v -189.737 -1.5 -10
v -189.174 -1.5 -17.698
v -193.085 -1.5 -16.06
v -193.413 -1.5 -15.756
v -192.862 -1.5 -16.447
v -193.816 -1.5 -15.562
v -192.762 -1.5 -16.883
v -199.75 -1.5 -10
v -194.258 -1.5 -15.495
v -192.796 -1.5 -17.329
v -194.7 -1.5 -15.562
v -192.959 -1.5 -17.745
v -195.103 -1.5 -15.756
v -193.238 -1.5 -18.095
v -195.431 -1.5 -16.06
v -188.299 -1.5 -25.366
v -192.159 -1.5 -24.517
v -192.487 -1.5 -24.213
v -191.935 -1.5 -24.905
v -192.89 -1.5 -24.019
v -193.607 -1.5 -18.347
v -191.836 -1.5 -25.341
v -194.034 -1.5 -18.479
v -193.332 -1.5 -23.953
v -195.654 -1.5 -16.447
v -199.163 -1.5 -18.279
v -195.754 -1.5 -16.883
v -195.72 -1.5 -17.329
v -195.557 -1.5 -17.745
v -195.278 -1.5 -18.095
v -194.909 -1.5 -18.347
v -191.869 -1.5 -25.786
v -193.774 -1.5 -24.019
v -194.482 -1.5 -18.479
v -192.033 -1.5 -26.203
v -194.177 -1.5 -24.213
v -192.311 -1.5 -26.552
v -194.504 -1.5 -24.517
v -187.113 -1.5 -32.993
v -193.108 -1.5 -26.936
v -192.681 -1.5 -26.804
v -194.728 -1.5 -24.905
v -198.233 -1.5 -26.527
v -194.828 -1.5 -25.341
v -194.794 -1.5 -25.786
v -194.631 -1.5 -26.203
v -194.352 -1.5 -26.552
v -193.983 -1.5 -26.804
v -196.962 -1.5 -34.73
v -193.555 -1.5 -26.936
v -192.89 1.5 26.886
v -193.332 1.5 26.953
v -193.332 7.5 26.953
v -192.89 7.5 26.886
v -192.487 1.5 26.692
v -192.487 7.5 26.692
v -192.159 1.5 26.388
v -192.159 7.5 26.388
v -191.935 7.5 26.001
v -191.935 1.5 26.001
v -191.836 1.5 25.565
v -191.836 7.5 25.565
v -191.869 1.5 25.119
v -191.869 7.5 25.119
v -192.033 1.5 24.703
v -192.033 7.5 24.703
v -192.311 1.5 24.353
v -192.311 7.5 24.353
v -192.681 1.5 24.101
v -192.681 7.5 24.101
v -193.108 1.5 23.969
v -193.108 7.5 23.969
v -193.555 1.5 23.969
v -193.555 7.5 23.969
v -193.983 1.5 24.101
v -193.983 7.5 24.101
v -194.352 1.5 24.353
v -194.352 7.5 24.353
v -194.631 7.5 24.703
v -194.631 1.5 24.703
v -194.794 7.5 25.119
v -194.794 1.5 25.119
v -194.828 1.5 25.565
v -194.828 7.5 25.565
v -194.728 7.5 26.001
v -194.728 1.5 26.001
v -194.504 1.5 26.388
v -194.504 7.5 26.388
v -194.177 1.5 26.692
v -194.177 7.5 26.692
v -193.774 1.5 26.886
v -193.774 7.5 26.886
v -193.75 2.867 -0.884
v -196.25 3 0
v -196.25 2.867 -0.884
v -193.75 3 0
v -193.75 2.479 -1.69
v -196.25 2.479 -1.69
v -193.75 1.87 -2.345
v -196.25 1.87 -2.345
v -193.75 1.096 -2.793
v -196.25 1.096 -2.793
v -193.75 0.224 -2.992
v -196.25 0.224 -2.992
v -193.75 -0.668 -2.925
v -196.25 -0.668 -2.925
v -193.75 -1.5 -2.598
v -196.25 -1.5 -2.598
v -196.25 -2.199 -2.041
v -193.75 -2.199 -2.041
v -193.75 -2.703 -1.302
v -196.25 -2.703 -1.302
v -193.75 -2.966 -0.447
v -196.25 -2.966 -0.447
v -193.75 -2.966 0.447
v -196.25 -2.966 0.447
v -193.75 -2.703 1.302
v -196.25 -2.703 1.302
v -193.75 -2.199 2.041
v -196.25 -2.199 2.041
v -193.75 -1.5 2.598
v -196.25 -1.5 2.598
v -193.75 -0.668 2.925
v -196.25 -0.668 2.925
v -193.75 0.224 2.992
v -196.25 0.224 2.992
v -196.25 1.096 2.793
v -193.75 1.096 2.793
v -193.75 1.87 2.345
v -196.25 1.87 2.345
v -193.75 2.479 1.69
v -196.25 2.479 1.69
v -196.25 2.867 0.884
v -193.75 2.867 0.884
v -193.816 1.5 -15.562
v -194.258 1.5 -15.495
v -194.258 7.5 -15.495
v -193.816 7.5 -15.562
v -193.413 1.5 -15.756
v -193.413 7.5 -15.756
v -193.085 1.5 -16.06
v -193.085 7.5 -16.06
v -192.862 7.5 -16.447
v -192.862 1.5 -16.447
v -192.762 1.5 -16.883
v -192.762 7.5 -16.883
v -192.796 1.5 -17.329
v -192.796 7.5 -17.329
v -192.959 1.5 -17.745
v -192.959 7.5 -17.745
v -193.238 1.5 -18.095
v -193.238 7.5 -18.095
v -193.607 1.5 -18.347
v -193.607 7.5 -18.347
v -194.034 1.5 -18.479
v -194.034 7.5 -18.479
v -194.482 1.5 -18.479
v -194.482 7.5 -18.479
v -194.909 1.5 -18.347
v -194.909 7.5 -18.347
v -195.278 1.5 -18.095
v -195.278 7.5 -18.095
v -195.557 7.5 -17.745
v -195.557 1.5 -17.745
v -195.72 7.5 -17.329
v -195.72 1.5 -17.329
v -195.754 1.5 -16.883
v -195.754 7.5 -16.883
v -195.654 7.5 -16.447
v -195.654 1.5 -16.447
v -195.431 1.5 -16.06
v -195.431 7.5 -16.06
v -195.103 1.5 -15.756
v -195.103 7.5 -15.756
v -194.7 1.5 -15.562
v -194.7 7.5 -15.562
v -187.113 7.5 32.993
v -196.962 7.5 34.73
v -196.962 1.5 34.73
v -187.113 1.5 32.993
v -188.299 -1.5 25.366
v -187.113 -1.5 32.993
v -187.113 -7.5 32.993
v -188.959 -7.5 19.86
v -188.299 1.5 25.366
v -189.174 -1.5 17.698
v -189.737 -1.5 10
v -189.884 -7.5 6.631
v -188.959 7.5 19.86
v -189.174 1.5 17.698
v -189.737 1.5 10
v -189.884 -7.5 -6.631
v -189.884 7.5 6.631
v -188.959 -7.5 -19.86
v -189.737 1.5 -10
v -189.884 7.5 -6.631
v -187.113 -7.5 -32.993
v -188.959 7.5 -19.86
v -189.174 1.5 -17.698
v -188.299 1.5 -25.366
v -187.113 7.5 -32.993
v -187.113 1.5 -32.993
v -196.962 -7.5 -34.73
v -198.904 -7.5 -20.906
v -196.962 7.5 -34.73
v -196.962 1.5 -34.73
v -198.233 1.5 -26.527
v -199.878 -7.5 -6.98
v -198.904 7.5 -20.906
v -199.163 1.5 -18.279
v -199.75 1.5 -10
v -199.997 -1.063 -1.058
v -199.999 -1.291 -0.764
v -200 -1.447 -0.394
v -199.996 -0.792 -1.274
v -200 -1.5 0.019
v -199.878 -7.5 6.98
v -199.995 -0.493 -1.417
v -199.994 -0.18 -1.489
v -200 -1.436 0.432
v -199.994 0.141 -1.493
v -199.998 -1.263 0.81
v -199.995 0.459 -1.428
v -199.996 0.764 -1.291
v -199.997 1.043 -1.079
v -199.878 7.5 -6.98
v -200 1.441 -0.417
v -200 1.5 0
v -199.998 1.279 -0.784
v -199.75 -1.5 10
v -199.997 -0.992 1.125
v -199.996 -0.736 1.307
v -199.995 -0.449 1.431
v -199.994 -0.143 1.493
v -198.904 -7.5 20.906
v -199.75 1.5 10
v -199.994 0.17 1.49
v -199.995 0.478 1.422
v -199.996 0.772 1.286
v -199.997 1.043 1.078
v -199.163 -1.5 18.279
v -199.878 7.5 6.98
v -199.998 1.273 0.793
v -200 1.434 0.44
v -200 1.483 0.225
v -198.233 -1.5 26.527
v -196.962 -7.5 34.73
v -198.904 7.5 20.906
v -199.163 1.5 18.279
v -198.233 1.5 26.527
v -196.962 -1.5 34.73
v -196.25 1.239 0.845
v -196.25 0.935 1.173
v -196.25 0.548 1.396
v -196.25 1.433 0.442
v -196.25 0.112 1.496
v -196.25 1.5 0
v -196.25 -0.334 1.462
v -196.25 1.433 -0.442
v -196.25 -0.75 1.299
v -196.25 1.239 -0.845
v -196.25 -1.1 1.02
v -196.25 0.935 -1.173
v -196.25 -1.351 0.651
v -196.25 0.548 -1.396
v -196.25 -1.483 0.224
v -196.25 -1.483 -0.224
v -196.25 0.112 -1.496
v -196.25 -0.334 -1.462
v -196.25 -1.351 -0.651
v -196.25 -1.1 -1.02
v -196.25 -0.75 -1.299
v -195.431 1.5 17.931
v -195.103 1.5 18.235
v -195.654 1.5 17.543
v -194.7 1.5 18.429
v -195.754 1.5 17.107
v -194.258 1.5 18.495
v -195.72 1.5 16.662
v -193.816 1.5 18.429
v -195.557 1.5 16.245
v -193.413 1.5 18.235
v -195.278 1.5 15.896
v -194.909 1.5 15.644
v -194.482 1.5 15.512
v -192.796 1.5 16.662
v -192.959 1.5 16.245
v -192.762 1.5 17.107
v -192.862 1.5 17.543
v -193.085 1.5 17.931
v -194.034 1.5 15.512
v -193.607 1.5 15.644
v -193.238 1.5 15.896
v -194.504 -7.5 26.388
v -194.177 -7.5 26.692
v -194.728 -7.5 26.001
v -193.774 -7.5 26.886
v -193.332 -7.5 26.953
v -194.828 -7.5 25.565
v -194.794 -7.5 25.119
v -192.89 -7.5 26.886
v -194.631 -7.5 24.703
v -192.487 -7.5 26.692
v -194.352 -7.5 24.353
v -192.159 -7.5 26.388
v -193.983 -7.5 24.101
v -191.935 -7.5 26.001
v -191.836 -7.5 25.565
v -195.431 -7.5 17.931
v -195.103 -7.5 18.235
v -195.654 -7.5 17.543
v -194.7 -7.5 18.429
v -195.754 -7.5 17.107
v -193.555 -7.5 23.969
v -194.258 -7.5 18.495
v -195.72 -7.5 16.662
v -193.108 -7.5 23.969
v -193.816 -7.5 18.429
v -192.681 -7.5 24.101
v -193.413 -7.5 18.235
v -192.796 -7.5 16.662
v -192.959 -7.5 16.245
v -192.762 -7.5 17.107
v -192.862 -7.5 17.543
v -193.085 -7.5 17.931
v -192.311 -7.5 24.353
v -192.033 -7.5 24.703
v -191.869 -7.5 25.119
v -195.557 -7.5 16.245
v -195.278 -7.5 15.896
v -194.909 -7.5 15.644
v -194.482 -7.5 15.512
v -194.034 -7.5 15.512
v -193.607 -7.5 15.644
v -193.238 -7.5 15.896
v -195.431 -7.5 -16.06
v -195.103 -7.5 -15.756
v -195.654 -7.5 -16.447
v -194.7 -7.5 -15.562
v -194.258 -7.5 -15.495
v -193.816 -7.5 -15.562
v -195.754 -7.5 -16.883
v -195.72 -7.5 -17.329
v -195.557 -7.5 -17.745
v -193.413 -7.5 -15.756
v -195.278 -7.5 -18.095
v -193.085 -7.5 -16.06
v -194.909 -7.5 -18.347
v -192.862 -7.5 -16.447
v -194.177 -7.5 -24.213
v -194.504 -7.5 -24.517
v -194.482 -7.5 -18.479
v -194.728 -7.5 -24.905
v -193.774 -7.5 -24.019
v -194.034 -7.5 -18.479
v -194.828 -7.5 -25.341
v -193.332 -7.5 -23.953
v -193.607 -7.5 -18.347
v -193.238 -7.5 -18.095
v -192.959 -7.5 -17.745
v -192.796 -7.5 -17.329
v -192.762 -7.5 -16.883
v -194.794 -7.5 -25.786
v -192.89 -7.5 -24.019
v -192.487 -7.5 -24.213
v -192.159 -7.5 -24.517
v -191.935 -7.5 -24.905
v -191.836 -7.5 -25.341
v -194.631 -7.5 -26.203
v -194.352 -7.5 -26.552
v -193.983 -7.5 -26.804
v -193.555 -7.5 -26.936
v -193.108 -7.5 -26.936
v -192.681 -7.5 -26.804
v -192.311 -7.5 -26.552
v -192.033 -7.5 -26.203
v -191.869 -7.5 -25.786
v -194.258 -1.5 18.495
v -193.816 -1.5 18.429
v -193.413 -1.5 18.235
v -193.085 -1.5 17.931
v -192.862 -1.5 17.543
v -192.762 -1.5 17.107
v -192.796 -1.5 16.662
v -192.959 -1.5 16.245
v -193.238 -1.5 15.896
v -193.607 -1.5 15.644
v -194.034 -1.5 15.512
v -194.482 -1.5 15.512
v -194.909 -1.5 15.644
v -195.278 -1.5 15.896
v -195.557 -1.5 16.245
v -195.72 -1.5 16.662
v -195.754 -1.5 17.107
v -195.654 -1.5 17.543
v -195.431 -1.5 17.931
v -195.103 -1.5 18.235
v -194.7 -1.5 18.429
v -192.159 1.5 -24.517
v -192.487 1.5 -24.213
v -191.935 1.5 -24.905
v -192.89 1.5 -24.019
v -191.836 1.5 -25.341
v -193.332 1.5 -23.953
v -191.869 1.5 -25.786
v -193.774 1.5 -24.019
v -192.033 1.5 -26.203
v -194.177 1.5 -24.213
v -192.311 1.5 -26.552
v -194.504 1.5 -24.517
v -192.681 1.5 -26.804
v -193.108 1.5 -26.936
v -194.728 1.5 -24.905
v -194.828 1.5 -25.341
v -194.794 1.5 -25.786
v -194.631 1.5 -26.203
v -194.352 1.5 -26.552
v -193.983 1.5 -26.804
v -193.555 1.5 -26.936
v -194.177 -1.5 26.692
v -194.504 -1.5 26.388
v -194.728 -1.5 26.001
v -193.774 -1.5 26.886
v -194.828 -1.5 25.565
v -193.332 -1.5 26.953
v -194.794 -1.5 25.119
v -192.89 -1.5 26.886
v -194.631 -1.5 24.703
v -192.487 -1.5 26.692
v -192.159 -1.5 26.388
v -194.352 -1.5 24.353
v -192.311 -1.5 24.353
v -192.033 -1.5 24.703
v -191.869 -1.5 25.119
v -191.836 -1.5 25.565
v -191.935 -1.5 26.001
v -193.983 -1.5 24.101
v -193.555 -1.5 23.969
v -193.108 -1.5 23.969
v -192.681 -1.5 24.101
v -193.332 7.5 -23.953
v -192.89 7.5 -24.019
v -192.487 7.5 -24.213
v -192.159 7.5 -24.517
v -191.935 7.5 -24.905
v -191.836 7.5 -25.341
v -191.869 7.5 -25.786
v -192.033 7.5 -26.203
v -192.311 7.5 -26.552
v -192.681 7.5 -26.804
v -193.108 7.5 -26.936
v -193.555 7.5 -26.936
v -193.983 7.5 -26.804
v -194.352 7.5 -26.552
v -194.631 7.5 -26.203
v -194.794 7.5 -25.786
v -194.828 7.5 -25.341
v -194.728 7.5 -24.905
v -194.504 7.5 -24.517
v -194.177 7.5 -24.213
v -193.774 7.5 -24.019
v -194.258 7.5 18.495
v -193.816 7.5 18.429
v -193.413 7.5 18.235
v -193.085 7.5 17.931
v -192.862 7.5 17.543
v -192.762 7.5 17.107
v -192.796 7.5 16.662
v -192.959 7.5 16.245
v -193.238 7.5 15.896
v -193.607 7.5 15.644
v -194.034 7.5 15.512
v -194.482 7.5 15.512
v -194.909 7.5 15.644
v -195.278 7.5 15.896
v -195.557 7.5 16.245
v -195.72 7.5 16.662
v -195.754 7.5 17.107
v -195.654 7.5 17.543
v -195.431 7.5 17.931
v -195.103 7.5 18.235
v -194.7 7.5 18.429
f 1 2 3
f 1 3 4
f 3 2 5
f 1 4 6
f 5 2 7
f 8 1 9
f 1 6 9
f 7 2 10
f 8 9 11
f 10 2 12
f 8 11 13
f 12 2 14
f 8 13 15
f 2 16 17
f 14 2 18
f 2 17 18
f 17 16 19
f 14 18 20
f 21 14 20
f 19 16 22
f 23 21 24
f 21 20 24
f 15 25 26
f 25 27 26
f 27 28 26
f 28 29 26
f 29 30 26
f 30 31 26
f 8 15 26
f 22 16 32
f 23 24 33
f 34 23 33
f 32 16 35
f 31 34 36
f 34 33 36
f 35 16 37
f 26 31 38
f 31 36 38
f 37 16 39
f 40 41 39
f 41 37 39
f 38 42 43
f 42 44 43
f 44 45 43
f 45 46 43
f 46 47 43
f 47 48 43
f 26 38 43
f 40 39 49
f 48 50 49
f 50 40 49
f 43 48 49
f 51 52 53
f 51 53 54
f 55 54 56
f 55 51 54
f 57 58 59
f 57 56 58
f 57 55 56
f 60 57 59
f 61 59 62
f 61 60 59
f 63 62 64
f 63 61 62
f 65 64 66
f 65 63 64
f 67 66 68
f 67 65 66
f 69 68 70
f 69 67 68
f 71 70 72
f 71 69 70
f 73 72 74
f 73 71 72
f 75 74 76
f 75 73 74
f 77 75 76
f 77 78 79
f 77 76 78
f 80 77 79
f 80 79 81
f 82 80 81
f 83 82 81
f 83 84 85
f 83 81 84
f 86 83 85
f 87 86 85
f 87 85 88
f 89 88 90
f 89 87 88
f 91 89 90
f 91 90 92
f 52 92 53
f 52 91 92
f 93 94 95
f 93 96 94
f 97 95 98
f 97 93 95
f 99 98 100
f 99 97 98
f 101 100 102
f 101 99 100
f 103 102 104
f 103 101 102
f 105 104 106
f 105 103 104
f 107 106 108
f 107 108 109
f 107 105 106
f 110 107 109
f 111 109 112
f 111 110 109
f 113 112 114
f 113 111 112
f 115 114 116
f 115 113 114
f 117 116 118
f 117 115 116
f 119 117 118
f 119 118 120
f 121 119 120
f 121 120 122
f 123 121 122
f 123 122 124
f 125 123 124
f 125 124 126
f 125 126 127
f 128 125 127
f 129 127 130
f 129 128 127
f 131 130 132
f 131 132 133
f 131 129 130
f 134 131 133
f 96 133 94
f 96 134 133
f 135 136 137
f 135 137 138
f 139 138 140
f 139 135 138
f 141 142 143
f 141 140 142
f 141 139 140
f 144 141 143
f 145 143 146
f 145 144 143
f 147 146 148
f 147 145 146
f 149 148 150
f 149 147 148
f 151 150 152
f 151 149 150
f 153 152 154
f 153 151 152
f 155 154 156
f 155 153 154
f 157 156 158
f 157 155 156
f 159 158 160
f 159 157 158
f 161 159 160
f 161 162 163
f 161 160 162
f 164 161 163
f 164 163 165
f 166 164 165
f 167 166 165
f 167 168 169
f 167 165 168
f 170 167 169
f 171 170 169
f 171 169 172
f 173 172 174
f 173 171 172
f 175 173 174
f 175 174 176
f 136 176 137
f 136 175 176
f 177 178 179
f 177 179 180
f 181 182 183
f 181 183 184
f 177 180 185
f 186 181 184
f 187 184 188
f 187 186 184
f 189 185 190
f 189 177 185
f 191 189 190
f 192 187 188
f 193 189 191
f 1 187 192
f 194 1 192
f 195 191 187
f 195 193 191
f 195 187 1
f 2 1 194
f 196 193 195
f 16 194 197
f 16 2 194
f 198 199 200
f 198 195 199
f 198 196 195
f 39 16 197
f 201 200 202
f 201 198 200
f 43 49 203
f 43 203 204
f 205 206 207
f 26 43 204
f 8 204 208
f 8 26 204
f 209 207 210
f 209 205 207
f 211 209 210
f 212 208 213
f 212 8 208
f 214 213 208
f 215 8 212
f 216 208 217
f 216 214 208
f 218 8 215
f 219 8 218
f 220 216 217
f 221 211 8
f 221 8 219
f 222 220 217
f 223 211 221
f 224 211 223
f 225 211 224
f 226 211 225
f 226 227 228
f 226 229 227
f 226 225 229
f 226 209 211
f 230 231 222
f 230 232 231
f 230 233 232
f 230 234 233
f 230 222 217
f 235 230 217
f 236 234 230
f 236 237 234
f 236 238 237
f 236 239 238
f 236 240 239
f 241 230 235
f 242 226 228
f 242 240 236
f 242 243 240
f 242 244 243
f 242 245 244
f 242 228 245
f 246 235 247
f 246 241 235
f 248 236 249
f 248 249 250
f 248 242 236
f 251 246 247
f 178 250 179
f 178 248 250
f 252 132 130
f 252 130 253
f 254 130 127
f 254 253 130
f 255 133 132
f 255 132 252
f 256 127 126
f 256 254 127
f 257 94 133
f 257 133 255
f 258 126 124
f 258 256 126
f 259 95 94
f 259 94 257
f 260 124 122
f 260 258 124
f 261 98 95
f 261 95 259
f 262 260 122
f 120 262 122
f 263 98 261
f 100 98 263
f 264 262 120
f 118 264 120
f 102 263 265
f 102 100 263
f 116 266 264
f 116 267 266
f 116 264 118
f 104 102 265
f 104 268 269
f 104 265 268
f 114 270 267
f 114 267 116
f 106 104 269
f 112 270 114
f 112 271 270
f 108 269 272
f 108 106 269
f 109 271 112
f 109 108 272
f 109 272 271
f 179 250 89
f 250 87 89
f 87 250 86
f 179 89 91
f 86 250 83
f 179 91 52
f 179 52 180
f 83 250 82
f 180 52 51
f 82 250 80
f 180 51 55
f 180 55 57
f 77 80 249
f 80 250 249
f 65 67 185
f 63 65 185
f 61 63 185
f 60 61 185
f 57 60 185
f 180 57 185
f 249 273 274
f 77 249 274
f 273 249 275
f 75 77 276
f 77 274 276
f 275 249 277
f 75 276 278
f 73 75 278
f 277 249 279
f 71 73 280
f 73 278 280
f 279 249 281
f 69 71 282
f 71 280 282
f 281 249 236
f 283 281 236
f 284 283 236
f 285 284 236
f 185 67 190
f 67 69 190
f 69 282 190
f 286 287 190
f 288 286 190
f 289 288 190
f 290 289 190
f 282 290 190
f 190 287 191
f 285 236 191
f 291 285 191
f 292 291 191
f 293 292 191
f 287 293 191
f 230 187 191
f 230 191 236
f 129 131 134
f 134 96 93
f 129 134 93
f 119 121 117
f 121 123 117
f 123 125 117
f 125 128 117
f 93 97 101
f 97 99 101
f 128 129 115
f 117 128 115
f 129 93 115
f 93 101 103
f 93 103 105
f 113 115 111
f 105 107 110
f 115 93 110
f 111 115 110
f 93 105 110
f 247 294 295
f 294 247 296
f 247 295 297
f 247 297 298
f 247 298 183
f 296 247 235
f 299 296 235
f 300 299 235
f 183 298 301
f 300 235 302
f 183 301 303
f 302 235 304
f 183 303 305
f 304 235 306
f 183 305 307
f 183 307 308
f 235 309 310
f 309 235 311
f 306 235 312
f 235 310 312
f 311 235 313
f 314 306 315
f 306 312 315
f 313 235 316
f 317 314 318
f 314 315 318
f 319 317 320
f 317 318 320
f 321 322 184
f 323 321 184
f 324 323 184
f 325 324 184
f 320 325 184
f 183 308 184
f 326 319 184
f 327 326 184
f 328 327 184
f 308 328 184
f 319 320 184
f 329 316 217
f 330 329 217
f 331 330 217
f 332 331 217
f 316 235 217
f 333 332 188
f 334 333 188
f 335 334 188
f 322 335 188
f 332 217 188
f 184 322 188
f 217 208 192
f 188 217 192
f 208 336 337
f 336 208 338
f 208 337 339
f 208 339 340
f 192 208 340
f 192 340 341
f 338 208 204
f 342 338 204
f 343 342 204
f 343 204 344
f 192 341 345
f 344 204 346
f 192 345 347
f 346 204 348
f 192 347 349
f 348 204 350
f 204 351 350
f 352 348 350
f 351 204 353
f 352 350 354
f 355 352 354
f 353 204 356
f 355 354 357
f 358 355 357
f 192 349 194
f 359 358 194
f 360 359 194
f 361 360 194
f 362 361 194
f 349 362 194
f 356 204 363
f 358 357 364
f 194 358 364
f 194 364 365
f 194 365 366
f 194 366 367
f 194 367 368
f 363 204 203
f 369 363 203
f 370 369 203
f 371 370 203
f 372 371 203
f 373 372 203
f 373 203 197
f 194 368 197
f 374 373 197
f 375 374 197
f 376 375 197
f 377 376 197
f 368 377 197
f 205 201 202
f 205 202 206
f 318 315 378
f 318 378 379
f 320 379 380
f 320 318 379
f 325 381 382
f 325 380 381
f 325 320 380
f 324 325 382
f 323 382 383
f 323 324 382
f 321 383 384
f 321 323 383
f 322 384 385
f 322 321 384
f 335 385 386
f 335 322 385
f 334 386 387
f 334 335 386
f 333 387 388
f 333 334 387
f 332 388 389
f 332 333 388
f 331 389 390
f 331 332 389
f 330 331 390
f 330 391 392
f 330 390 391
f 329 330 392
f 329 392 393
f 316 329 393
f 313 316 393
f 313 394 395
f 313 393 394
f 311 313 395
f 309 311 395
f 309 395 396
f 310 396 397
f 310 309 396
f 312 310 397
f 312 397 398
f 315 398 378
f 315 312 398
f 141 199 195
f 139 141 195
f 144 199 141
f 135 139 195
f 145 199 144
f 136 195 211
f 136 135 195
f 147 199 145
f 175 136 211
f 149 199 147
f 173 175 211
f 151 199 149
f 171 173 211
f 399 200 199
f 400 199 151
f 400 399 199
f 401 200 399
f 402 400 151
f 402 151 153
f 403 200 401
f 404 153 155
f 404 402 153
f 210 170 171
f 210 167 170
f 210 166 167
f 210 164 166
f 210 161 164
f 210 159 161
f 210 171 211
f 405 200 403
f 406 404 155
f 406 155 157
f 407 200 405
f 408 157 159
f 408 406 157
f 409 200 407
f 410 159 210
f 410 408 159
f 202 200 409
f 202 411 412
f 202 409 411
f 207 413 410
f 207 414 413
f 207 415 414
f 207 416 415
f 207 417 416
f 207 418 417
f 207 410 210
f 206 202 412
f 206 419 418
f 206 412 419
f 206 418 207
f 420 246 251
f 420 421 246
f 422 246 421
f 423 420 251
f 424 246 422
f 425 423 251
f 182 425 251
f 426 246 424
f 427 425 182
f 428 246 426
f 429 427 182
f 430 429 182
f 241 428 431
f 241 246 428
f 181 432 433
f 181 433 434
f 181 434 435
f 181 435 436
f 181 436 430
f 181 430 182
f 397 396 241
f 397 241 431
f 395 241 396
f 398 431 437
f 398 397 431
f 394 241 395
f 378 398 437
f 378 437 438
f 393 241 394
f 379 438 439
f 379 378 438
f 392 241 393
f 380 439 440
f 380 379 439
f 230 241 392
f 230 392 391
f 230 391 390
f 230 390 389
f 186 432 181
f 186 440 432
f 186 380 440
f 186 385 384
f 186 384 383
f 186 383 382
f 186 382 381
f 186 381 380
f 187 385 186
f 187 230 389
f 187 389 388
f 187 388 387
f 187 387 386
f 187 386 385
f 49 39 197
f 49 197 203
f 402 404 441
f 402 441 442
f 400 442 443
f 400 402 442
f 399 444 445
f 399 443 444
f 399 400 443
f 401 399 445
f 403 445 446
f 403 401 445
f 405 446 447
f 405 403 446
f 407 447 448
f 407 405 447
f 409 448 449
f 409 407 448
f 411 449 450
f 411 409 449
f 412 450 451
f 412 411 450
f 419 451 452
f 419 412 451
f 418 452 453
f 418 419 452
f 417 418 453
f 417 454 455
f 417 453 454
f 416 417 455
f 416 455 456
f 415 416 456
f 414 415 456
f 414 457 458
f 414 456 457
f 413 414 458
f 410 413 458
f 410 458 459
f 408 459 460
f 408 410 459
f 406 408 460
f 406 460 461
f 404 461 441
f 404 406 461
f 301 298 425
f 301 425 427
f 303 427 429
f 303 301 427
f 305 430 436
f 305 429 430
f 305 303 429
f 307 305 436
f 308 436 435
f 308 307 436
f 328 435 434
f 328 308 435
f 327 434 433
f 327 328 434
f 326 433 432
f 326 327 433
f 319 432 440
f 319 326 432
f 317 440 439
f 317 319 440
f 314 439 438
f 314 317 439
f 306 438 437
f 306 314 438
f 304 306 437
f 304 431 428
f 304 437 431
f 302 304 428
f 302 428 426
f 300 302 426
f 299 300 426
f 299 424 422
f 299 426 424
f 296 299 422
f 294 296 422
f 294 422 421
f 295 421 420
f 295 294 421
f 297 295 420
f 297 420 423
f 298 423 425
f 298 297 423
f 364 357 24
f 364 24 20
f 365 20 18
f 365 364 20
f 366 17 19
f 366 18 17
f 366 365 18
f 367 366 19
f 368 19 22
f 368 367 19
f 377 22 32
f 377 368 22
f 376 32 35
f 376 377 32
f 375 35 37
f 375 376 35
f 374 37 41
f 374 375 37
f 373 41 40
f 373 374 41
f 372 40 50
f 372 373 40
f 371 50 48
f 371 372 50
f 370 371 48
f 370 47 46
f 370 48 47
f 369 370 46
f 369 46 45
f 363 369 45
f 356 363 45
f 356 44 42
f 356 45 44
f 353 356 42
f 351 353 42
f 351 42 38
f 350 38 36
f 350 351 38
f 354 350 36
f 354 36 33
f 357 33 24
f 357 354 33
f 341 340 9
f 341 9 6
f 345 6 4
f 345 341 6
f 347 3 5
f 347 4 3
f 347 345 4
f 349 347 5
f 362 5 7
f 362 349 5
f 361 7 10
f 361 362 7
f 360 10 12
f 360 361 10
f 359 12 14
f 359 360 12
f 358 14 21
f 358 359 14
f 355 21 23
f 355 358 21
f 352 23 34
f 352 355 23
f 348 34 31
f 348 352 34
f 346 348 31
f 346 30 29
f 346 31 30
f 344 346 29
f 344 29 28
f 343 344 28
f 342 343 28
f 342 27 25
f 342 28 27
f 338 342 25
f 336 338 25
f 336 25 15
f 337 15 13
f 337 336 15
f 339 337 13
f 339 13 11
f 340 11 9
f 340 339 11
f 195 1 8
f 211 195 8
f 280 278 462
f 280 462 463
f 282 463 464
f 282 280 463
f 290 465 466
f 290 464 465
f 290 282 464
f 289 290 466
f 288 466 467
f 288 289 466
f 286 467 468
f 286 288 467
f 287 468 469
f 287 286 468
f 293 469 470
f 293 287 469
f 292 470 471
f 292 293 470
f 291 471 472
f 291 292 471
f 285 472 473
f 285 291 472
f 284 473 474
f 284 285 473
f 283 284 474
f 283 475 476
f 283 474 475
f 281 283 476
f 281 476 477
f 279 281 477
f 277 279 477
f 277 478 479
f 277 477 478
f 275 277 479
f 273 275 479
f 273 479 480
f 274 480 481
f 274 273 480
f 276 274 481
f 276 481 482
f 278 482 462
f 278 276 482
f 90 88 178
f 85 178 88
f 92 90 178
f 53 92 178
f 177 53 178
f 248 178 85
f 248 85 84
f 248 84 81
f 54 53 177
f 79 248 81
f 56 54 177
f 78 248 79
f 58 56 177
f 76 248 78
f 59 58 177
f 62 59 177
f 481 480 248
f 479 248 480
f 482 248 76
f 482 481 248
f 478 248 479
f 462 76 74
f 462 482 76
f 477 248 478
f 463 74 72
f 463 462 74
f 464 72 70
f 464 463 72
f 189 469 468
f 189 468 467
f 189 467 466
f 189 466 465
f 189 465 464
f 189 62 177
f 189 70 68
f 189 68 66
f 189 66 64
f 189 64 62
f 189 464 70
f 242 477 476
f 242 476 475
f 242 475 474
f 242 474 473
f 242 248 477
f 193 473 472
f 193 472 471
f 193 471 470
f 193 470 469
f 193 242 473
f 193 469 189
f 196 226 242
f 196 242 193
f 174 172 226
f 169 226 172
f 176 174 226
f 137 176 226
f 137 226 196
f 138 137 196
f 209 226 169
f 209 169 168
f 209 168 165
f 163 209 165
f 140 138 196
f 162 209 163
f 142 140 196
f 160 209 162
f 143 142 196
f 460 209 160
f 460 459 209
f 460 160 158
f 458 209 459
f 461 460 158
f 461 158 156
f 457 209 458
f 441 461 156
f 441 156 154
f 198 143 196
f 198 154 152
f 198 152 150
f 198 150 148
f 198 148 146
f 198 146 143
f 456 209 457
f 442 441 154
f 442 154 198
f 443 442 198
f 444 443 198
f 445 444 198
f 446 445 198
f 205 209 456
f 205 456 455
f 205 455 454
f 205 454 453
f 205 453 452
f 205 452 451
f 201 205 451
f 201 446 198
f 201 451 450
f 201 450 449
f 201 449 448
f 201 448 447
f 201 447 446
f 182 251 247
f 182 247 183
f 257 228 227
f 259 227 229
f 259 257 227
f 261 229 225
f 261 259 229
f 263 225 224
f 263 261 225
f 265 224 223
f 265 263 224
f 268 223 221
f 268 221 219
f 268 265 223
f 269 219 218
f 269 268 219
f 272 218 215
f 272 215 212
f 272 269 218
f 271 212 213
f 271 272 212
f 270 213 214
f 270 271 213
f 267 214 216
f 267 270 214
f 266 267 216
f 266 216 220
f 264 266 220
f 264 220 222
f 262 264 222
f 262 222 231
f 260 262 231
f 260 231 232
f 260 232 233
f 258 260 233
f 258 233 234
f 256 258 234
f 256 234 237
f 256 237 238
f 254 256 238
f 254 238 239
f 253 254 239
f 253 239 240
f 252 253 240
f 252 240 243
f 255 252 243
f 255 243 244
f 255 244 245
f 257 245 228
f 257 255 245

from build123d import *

# Parameters (mm, degrees)
BASE_DEPTH            = 7.5
MOUNT_START           = -1.5
MOUNT_DEPTH           = 3
MOUNT_HOLE_DEPTH      = 204.131478566
MOUNT_HOLE_DEPTH_BACK = 204.131478566
SKETCH12_R            = 1.5
SKETCH14_R            = 1.5
SHAFT_HOLE_DEPTH      = 37.394984425
SKETCH13_W            = 2.5
SKETCH13_H            = 3


with BuildPart() as part:
    # Sketch9 → base (new, symmetric)
    with BuildSketch(Plane(origin=(0, 0, 0), x_dir=(1, 0, 0), z_dir=(0, 1, 0))):
        with BuildLine():
            ThreePointArc((-187.113473072, -32.993153757), (-190, 0), (-187.113473072, 32.993153757))
            Line((-187.113473072, 32.993153757), (-196.961550602, 34.729635533))
            ThreePointArc((-196.961550602, 34.729635533), (-200, 0), (-196.961550602, -34.729635533))
            Line((-196.961550602, -34.729635533), (-187.113473072, -32.993153757))
        make_face()
    extrude(amount=BASE_DEPTH, both=True)

    # Sketch11 → mount (cut)
    with BuildSketch(Plane(origin=(0, 0, 0), x_dir=(1, 0, 0), z_dir=(0, 1, 0)).offset(MOUNT_START)):
        with BuildLine():
            Line((-189.73665961, -10), (-199.749843554, -10))
            ThreePointArc((-199.749843554, -10), (-198.7407137, -22.408228804), (-196.961550602, -34.729635533))
            Line((-196.961550602, -34.729635533), (-187.113473072, -32.993153757))
            ThreePointArc((-187.113473072, -32.993153757), (-188.775466906, -21.536552519), (-189.73665961, -10))
        make_face()
        with BuildLine():
            Line((-189.73665961, 10), (-199.749843554, 10))
            ThreePointArc((-199.749843554, 10), (-198.7407137, 22.408228804), (-196.961550602, 34.729635533))
            Line((-196.961550602, 34.729635533), (-187.113473072, 32.993153757))
            ThreePointArc((-187.113473072, 32.993153757), (-188.775466906, 21.536552519), (-189.73665961, 10))
        make_face()
    extrude(amount=MOUNT_DEPTH, mode=Mode.SUBTRACT)

    # Sketch12 → mount hole (cut, two sides: drawn at the far end of the back side and taken through both)
    with BuildSketch(Plane(origin=(0, 0, 0), x_dir=(1, 0, 0), z_dir=(0, 1, 0)).offset(-MOUNT_HOLE_DEPTH_BACK)):
        with Locations(Location((-193.331747968, 25.452607483, 0), (0, 0, 270))):
            Circle(SKETCH12_R)
        with Locations(Location((-194.257966128, 16.995369836, 0), (0, 0, 270))):
            Circle(SKETCH12_R)
        with Locations(Location((-194.257966128, -16.995369836, 0), (0, 0, 270))):
            Circle(SKETCH12_R)
        with Locations(Location((-193.331747968, -25.452607483, 0), (0, 0, 270))):
            Circle(SKETCH12_R)
    extrude(amount=MOUNT_HOLE_DEPTH + MOUNT_HOLE_DEPTH_BACK, mode=Mode.SUBTRACT)

    # Sketch14 → shaft hole (cut, through all)
    with BuildSketch(Plane.ZY.offset(195)):
        with Locations(Location((0, 0, 0), (0, 0, 90))):
            Circle(SKETCH14_R)
    extrude(amount=SHAFT_HOLE_DEPTH, mode=Mode.SUBTRACT)

    # Sketch13 → bearing hole (revolve, cut)
    with BuildSketch(Plane(origin=(0, 0, 0), x_dir=(1, 0, 0), z_dir=(0, 1, 0)), mode=Mode.PRIVATE) as bearing_hole_sk:
        with Locations((-195, 1.5)):
            Rectangle(SKETCH13_W, SKETCH13_H)
    revolve(bearing_hole_sk.sketch.rotate(Axis((0, 0, 0), (-1, 0, 0)), 270), axis=Axis((0, 0, 0), (-1, 0, 0)), mode=Mode.SUBTRACT)


solid = part.part
